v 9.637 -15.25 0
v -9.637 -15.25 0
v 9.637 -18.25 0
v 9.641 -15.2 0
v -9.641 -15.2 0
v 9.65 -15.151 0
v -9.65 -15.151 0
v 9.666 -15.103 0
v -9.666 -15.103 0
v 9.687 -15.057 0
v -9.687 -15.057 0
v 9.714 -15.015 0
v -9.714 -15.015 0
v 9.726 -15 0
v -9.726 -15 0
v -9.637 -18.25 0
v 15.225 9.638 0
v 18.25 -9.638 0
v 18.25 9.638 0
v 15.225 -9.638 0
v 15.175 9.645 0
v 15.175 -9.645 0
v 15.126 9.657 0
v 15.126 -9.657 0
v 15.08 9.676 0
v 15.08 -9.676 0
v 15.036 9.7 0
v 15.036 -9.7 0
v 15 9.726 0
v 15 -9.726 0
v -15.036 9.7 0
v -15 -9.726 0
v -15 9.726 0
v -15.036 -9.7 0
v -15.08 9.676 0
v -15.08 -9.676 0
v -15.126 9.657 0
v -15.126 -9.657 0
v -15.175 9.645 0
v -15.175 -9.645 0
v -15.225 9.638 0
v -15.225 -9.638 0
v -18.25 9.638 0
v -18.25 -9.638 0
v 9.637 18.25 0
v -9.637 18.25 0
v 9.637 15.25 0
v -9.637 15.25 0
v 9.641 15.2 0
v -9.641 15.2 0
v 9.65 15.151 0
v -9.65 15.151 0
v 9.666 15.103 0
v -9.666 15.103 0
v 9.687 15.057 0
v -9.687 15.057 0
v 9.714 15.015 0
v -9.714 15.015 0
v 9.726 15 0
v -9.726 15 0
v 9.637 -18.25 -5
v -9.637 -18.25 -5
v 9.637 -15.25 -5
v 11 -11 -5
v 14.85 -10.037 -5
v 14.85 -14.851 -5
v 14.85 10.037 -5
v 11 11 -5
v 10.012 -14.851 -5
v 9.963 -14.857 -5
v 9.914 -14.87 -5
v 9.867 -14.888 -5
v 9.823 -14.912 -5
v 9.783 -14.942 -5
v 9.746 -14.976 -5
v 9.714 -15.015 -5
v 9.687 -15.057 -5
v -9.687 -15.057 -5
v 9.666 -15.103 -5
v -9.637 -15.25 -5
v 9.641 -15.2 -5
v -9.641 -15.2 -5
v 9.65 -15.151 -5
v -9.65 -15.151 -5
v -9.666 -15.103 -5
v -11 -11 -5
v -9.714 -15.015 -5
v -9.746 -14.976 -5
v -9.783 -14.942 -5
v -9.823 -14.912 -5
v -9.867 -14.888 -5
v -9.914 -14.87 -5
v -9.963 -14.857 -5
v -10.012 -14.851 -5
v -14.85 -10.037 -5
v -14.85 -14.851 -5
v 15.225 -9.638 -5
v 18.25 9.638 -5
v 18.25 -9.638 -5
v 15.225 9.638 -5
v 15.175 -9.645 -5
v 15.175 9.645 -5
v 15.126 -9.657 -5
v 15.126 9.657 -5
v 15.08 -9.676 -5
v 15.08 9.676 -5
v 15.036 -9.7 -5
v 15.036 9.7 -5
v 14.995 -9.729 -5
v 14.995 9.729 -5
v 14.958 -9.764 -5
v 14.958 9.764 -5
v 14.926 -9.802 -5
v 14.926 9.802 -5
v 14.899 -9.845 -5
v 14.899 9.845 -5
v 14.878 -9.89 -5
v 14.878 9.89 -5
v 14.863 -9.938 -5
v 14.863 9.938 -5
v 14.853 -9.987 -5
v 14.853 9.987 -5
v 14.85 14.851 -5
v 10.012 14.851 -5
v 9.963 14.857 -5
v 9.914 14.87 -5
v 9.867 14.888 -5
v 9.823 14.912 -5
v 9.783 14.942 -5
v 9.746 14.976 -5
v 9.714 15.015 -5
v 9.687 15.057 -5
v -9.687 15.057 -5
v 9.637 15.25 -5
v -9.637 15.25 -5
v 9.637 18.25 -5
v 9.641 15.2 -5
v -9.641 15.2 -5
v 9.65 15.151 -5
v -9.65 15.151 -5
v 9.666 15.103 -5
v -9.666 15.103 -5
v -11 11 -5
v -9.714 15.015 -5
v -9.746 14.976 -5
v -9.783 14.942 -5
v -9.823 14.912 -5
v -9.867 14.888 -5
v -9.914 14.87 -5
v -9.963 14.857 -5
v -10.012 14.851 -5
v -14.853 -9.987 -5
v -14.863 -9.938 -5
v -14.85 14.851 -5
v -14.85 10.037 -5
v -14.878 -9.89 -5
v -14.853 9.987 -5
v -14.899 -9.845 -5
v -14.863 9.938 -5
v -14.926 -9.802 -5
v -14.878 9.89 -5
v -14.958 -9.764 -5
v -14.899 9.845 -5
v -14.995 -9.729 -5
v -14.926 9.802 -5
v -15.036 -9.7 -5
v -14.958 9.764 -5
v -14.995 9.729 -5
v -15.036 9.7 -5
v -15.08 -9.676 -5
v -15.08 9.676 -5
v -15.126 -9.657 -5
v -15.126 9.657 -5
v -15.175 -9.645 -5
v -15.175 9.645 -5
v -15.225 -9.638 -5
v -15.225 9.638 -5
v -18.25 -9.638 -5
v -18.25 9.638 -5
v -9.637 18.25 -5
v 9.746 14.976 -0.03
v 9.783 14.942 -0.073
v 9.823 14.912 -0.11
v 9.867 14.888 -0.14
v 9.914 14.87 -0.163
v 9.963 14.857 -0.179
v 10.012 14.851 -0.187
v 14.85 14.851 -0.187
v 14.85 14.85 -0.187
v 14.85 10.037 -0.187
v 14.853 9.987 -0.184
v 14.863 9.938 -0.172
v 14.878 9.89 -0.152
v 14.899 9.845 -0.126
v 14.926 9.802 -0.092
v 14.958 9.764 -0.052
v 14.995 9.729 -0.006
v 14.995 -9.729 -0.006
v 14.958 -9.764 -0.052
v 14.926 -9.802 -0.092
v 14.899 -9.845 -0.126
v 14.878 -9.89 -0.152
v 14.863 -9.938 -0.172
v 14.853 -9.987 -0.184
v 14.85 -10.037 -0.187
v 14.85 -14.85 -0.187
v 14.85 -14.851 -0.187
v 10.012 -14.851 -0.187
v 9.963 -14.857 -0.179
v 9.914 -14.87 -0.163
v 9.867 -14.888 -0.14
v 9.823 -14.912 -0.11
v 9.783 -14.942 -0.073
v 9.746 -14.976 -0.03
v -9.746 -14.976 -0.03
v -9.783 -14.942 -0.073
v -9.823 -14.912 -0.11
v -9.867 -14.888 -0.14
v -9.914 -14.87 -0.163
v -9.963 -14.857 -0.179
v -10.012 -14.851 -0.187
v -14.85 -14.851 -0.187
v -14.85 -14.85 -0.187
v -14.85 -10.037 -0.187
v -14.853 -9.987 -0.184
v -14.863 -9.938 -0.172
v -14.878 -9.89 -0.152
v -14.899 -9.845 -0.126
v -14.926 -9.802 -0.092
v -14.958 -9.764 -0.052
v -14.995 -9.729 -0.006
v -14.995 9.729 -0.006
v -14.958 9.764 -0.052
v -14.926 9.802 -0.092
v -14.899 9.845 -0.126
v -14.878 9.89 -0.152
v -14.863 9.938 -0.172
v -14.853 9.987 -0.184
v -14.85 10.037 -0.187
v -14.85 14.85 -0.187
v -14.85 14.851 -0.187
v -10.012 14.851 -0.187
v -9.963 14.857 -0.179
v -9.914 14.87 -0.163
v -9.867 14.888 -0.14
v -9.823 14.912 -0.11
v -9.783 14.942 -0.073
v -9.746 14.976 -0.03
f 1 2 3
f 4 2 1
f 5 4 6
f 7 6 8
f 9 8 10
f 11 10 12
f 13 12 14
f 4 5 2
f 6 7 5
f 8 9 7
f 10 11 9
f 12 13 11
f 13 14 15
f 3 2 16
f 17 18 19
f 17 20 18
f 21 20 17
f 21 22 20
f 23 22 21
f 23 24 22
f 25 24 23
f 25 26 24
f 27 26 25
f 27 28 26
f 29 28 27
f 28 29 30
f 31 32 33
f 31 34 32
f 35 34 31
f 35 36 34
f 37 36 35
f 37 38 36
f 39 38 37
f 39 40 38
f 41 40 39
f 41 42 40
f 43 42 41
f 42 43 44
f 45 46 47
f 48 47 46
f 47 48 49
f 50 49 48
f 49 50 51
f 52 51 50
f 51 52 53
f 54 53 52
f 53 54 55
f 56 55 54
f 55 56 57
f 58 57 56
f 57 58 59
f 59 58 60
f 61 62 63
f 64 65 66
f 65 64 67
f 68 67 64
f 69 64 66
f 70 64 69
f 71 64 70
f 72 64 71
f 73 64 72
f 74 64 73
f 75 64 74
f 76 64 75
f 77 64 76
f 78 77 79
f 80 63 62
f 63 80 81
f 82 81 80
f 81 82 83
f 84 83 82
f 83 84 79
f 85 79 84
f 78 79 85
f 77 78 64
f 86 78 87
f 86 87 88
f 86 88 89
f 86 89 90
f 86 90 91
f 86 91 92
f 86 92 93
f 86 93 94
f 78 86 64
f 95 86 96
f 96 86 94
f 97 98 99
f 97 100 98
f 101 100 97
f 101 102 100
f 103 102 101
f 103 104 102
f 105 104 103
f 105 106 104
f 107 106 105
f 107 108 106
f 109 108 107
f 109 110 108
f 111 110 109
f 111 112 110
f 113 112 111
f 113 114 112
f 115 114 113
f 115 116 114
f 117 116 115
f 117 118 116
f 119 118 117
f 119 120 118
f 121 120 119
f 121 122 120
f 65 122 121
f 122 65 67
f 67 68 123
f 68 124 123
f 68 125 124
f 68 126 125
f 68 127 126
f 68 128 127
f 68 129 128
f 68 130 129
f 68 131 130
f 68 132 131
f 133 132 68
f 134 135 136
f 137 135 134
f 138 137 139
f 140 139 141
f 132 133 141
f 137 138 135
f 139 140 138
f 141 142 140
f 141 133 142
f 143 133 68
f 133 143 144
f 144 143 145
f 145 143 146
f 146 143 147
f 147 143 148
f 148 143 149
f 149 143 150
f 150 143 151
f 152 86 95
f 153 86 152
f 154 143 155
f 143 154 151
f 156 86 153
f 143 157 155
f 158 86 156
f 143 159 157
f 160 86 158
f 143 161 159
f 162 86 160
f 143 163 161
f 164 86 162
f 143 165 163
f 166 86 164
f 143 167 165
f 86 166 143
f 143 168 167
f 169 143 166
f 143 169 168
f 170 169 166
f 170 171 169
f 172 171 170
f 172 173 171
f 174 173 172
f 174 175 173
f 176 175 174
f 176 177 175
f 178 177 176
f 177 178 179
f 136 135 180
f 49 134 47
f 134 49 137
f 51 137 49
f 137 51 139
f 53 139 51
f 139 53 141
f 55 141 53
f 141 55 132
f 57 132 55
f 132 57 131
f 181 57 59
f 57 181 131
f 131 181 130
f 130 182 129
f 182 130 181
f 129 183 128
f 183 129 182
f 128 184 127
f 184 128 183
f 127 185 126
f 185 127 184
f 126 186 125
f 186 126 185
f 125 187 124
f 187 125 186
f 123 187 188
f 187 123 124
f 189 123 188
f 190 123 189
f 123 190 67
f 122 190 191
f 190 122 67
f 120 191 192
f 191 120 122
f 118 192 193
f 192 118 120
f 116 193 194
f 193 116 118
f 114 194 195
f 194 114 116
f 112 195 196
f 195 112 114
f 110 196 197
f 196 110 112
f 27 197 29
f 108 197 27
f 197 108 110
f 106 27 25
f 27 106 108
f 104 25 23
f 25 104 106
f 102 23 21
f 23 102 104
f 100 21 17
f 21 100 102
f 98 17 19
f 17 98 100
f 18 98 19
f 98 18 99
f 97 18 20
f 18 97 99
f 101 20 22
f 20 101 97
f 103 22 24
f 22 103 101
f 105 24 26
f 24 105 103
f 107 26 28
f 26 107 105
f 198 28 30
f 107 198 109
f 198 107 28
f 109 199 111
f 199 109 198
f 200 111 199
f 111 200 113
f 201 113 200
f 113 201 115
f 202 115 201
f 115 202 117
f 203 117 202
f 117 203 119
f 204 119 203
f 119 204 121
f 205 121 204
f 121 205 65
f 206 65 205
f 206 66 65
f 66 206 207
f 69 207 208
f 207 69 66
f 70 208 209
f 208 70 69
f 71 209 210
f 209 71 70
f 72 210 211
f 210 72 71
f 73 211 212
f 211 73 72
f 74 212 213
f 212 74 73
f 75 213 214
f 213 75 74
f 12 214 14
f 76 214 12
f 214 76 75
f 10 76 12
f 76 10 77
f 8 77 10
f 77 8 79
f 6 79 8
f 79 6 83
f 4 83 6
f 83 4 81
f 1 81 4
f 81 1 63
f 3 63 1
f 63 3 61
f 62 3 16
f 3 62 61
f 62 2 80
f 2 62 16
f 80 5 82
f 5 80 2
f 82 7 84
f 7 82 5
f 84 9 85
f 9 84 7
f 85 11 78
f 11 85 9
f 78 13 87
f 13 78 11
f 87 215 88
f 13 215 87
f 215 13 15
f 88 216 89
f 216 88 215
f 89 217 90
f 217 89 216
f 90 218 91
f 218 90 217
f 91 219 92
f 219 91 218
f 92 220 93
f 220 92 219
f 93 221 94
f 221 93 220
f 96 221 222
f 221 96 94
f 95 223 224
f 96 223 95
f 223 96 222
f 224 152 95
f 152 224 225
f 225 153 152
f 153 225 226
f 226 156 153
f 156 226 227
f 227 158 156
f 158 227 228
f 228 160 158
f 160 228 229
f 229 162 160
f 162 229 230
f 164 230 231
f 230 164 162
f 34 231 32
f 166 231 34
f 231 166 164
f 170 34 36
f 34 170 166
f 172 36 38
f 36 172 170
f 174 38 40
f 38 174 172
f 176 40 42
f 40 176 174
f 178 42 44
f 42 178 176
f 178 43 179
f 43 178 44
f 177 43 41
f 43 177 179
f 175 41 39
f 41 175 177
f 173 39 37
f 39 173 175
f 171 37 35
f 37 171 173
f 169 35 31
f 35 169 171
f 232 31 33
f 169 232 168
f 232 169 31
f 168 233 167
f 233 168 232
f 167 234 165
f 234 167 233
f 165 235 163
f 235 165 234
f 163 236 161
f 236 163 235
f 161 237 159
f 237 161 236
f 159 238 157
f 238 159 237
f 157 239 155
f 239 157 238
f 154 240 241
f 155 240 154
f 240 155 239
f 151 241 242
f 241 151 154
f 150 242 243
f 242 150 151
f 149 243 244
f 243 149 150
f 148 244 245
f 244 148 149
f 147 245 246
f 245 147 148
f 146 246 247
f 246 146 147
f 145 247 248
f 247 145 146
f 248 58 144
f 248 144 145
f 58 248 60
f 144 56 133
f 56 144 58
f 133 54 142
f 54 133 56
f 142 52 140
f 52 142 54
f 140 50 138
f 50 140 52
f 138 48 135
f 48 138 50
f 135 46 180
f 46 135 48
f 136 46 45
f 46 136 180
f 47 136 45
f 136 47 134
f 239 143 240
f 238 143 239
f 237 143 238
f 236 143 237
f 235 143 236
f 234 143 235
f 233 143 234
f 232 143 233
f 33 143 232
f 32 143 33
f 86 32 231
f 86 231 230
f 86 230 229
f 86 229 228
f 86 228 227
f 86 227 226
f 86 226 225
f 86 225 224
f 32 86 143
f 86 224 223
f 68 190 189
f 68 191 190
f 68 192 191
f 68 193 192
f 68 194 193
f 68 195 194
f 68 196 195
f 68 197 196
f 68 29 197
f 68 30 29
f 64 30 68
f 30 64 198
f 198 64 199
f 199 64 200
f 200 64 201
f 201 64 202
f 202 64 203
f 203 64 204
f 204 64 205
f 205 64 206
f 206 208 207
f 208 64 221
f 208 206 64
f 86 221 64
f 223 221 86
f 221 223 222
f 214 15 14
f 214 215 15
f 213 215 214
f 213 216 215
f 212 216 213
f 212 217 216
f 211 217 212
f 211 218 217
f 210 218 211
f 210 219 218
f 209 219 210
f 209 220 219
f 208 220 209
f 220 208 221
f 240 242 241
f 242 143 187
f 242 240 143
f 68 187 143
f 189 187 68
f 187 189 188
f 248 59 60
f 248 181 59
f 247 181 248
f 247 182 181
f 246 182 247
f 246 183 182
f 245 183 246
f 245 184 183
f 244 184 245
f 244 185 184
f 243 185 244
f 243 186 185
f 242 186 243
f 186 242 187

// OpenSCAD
// file: meta.scad
deviceFudge=0.5;//mm, fudge factor to account for printing inaccuracy, shrinkage
PCBThickness=1.6; //mm
pinRecepticalTop=5.5;//mm above pcb that the pin receptical extends
pinsHeight=pinRecepticalTop+4.2+2;//mm above pcb, fully extended
maxSubstrateThickness=3;//mm
wallT=3;//mm, wall thickness
PCBShelfW=0.6;//mm, the pcb sits on this
belowPBC=1;//mm extension below PCB
crownFraction=0.55;//fraction of each side length to subtract to make extension corners

solidHeight=pinsHeight;//mm above pcb for solid wall
crownHeight=maxSubstrateThickness+0.5;//mm, corners extension above pin ends
totalHeight=belowPBC+PCBThickness+solidHeight+crownHeight;

module base ( xyDev ) {
    vDeviceDim=xyDev+deviceFudge;
    xyLen=vDeviceDim+wallT*2;
    difference(){
        cube([xyLen,xyLen,totalHeight],center = true);
        translate([0,0,belowPBC]) cube([vDeviceDim,vDeviceDim,totalHeight],center = true);
        cube([vDeviceDim-2*PCBShelfW,vDeviceDim-2*PCBShelfW,totalHeight+1],center = true);
        
        translate([0,xyLen/2,totalHeight/2+(crownHeight+1)/2-crownHeight]) cube([xyLen*crownFraction,xyLen,crownHeight+1],center = true);
        rotate([0,0,180]) translate([-xyLen*crownFraction/2,-xyLen/2,totalHeight/2-crownHeight]) rotate([0,90,0])  linear_extrude(height=xyLen*crownFraction) polygon([[0,0],[0,wallT],[(pinsHeight-pinRecepticalTop),wallT]]);
        
        rotate([0,0,90]) translate([0,xyLen/2,totalHeight/2+(crownHeight+1)/2-crownHeight]) cube([xyLen*crownFraction,xyLen,crownHeight+1],center = true);
        rotate([0,0,270]) translate([-xyLen*crownFraction/2,-xyLen/2,totalHeight/2-crownHeight]) rotate([0,90,0])  linear_extrude(height=xyLen*crownFraction) polygon([[0,0],[0,wallT],[(pinsHeight-pinRecepticalTop),wallT]]);
        
        rotate([0,0,180]) translate([0,xyLen/2,totalHeight/2+(crownHeight+1)/2-crownHeight]) cube([xyLen*crownFraction,xyLen,crownHeight+1],center = true);
        translate([-xyLen*crownFraction/2,-xyLen/2,totalHeight/2-crownHeight]) rotate([0,90,0])  linear_extrude(height=xyLen*crownFraction) polygon([[0,0],[0,wallT],[(pinsHeight-pinRecepticalTop),wallT]]);
        
        rotate([0,0,270]) translate([0,xyLen/2,totalHeight/2+(crownHeight+1)/2-crownHeight]) cube([xyLen*crownFraction,xyLen,crownHeight+1],center = true);
        rotate([0,0,90]) translate([-xyLen*crownFraction/2,-xyLen/2,totalHeight/2-crownHeight]) rotate([0,90,0])  linear_extrude(height=xyLen*crownFraction) polygon([[0,0],[0,wallT],[(pinsHeight-pinRecepticalTop),wallT]]);
    }
}
// main file
include <meta.scad>;

$fn=50;
//deviceDim=28; //mm, x,y dimension of substrate, pcb
deviceDim=30; //mm, x,y dimension of substrate, pcb
//deviceDim=25; //mm, x,y dimension of substrate, pcb, DBG
capFit=0.4; //mm, trace a circle of this radius around the crown pieces to define the cap cutouts
//capX = 39;//mm
//capY = 60;//mm

vDeviceDim=deviceDim+deviceFudge;
xyLen=vDeviceDim+wallT*2;

capX = xyLen;
capY = xyLen;

windowDim = deviceDim-4*2;
capT = 5;
rotate([180,0,0])
difference(){
    linear_extrude(height=capT){
        difference(){
            square([capX,capY], center=true);
            minkowski(){
              projection(cut = true) translate([0,0,-totalHeight/2+1]) base(deviceDim);
              circle(capFit,center=true);
            }
            square([windowDim,windowDim], center=true);
        }
    }
    
    linear_extrude(height=capT,scale=windowDim/deviceDim){
        square([deviceDim,deviceDim], center=true);
    }
}
